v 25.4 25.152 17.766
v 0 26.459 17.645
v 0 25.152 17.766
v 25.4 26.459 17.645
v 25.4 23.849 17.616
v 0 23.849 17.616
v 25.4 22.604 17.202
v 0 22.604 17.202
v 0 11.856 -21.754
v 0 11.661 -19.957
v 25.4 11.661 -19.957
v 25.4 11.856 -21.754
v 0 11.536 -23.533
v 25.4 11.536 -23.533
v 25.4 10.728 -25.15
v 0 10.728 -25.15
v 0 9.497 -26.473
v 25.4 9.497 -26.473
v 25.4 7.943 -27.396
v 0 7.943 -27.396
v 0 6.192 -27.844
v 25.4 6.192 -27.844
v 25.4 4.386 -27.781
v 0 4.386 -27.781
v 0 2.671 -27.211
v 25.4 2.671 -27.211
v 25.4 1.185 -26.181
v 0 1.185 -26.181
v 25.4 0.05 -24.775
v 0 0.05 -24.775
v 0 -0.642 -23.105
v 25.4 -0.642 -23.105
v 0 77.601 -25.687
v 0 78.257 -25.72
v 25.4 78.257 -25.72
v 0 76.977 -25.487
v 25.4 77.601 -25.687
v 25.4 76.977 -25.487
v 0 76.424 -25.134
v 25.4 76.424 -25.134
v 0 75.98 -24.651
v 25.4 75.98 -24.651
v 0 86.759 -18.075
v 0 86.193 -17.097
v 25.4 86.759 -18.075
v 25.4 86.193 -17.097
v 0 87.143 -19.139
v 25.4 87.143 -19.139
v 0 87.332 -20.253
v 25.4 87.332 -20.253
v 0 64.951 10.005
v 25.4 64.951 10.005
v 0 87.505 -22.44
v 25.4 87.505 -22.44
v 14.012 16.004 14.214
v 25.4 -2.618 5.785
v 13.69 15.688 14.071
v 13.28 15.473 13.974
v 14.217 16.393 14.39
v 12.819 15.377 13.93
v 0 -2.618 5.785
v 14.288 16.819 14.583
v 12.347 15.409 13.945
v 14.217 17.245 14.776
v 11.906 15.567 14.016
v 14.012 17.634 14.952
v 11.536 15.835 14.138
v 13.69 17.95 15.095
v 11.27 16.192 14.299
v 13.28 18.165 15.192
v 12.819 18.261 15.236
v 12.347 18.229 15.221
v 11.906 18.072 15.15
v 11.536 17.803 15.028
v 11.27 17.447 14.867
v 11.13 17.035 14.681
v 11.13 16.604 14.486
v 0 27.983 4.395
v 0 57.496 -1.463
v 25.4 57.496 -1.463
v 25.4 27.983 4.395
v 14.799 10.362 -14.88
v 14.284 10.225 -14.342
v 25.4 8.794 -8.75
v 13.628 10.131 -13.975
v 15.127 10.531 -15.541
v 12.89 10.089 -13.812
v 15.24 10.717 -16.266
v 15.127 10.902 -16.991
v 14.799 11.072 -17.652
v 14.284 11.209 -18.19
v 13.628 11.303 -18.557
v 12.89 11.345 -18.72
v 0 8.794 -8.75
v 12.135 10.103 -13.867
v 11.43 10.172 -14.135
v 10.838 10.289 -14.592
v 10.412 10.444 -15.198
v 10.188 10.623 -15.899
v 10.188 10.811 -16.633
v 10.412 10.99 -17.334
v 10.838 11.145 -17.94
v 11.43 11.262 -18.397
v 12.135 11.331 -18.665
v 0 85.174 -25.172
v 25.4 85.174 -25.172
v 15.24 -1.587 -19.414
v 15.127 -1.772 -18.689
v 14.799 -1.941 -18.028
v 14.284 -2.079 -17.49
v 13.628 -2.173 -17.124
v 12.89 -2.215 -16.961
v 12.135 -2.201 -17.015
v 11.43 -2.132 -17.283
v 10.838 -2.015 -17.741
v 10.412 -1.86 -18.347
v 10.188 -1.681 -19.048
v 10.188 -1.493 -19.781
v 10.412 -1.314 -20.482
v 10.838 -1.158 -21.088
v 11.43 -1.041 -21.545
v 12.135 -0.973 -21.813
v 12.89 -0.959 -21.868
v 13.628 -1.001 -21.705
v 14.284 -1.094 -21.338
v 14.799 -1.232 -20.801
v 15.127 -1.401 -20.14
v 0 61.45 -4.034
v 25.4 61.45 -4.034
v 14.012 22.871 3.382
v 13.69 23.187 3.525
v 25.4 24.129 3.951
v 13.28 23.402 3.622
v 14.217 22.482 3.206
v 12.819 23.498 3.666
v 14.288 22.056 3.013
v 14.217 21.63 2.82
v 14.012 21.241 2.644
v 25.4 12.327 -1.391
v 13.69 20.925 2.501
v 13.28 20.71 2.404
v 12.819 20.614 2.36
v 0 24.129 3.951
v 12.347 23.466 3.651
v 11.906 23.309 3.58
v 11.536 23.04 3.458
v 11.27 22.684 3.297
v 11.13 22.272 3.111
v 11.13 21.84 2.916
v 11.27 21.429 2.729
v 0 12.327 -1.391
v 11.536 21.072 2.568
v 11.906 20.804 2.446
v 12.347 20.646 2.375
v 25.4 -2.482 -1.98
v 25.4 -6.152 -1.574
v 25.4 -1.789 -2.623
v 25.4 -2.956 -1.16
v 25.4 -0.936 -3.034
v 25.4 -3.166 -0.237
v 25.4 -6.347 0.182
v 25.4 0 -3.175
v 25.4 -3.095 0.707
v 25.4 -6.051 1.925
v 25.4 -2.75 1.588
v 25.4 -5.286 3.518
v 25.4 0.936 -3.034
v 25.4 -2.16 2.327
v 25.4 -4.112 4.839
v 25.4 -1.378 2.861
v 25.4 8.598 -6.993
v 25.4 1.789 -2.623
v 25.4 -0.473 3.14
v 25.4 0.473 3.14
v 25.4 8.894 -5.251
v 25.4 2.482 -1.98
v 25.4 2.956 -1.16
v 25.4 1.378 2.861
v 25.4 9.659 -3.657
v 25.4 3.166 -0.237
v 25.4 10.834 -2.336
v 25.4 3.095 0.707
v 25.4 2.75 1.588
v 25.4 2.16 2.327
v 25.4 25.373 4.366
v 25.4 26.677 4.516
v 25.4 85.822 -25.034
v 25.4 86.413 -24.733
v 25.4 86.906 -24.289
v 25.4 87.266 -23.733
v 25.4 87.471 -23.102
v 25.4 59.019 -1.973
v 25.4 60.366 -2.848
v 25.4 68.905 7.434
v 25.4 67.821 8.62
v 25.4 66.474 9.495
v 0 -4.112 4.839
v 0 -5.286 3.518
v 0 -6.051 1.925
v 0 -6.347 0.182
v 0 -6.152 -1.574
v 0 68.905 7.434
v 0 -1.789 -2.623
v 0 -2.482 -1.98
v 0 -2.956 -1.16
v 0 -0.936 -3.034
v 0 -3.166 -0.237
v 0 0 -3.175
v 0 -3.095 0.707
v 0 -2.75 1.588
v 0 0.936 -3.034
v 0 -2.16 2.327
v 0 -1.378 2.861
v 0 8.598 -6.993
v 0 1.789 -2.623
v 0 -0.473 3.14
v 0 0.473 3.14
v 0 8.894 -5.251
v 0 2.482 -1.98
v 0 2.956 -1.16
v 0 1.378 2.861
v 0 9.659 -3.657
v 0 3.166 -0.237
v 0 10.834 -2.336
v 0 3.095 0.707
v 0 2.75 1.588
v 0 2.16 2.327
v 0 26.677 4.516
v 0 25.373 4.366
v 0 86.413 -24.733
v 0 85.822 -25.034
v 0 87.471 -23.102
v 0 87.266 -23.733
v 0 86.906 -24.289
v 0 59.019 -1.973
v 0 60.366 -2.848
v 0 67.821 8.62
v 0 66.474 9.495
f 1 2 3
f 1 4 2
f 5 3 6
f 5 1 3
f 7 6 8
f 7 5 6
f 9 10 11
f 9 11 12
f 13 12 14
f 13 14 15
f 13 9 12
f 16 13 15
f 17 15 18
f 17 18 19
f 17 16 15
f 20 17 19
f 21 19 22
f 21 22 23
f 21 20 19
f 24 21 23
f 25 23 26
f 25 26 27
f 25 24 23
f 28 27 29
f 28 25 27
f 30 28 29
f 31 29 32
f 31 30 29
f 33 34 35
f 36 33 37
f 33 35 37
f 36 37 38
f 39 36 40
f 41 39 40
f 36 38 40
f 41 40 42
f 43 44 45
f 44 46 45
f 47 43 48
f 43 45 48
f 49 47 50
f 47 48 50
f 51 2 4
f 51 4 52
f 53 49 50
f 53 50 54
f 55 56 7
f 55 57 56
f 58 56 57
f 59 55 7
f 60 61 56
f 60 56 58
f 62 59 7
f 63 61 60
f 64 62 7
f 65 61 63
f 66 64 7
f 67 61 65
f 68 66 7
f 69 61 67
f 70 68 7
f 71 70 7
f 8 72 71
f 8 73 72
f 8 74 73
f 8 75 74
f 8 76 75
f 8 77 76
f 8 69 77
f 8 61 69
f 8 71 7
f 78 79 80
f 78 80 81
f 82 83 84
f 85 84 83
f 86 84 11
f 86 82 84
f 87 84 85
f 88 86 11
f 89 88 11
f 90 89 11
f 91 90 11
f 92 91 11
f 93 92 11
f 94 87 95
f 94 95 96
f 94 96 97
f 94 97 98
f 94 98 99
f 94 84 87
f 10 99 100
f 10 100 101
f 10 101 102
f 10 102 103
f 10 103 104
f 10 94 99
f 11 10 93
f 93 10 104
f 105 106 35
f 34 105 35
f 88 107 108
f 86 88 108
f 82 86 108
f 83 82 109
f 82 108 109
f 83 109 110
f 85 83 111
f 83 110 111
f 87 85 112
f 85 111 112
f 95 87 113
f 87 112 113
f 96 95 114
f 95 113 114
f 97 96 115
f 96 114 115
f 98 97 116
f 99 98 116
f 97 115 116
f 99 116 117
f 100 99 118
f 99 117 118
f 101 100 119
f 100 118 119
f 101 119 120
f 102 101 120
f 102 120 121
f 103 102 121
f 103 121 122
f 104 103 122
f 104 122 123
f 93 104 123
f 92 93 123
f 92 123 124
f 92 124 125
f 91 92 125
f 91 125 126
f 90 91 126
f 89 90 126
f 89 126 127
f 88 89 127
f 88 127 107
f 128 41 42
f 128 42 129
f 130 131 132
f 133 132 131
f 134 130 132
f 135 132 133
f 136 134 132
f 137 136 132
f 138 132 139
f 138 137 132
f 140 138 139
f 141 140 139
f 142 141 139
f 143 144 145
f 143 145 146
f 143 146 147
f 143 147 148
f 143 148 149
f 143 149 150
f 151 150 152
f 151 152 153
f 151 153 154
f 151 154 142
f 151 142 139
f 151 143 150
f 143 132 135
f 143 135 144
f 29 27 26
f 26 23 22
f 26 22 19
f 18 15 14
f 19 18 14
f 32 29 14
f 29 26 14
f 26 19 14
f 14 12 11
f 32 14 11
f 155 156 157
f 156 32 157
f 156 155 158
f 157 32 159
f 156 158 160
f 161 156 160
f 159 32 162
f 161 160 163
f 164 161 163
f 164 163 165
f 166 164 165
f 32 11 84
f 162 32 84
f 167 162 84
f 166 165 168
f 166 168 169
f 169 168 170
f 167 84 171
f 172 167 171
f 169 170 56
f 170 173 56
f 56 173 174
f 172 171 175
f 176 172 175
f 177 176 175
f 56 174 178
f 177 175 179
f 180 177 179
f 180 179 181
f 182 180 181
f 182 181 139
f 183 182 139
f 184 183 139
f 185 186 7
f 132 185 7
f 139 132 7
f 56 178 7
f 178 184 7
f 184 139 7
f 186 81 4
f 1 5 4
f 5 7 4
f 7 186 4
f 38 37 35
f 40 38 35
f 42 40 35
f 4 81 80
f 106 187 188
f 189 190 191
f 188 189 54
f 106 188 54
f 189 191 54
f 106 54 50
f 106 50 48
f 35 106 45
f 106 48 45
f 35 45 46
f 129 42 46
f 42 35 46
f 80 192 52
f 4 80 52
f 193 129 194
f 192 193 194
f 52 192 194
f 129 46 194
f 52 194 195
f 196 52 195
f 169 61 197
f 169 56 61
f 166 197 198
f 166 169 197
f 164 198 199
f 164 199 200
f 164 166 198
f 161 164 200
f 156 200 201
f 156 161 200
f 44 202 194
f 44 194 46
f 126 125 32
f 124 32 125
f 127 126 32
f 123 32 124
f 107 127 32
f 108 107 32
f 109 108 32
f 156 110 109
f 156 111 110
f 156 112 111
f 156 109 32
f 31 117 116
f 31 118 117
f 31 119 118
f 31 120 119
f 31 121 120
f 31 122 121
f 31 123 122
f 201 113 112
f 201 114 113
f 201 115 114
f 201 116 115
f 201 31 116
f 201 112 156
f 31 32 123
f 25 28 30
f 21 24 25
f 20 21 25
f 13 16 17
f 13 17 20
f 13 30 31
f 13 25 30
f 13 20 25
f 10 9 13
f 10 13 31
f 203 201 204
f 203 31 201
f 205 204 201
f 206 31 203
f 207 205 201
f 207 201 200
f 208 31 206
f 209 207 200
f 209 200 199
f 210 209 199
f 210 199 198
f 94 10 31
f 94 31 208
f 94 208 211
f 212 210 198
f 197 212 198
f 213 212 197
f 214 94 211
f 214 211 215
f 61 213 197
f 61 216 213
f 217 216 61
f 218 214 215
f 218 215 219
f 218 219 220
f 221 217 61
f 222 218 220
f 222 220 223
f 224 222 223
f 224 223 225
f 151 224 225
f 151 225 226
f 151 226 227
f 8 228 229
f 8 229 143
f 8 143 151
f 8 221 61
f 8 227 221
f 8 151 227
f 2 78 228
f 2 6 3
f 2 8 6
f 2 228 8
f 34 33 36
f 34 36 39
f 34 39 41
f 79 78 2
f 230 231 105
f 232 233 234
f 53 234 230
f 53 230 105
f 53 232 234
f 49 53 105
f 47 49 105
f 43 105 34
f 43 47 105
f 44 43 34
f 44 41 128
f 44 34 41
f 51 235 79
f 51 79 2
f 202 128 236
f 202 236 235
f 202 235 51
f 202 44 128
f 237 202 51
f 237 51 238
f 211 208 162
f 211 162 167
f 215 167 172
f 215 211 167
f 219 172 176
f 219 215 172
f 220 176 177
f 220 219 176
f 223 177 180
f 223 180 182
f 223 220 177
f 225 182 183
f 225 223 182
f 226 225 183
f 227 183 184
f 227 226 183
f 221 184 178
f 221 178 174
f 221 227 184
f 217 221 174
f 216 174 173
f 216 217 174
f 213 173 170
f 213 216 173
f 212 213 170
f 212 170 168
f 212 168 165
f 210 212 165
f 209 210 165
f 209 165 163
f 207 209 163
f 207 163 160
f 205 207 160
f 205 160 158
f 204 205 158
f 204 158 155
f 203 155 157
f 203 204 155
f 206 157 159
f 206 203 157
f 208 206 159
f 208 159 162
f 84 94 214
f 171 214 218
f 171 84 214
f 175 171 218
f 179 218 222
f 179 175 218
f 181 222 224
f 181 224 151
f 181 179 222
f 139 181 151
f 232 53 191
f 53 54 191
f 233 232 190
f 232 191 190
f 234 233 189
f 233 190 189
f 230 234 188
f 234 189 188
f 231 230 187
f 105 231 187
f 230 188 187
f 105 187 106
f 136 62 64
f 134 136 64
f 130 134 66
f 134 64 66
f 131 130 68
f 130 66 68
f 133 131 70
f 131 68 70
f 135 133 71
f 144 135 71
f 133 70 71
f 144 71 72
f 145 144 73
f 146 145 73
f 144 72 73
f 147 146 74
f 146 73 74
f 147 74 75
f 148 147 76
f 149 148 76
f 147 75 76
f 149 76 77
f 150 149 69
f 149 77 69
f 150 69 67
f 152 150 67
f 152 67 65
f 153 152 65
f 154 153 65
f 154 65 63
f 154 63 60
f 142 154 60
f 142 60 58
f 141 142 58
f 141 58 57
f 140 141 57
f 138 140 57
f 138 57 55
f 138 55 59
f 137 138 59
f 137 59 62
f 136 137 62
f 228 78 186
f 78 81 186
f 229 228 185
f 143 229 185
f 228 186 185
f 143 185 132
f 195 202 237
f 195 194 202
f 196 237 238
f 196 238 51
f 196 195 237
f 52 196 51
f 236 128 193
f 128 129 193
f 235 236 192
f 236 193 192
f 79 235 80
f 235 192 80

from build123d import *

# Parameters (mm, degrees)
SKETCH1_R           = 3.175
BOSS_EXTRUDE1_DEPTH = 25.4
FILLET1_R           = 6.35
CUT_EXTRUDE1_REACH  = 97.723
SKETCH2_R           = 2.54
CUT_EXTRUDE2_REACH  = 69.917
SKETCH3_R           = 1.5875
FILLET2_R           = 2.54


with BuildPart() as part:
    # Sketch1 → Boss-Extrude1 (new body)
    with BuildSketch(Plane(origin=(0, 0, 0), x_dir=(0, 0, -1), z_dir=(1, 0, 0))):
        with BuildLine():
            Line((-9.510223779, 67.442100456), (18.518782335, 87.194732923))
            Line((18.518782335, 87.194732923), (24.971703957, 87.705940953))
            Line((24.971703957, 87.705940953), (25.834610798, 76.813564689))
            Line((25.834610798, 76.813564689), (1.957775741, 59.987054843))
            Line((1.957775741, 59.987054843), (-4.791410802, 25.984772629))
            Line((-4.791410802, 25.984772629), (3.587814077, 7.472662593))
            Line((3.587814077, 7.472662593), (19.957119618, 11.661325034))
            ThreePointArc((19.957119618, 11.661325034), (27.683063897, 7.083685359), (23.105424222, -0.64225892))
            Line((23.105424222, -0.64225892), (-3.587814077, -7.472662593))
            Line((-3.587814077, -7.472662593), (-18.041777156, 24.460285718))
            Line((-18.041777156, 24.460285718), (-9.510223779, 67.442100456))
        make_face()
        Circle(SKETCH1_R, mode=Mode.SUBTRACT)
    extrude(amount=BOSS_EXTRUDE1_DEPTH)

    # Fillet1
    fillet1_edges = [part.edges().sort_by_distance(p)[0] for p in [
        (12.7, 67.442100456, 9.510223779),
        (12.7, 87.194732923, -18.518782335),
        (12.7, 59.987054843, -1.957775741),
        (12.7, 25.984772629, 4.791410802),
        (12.7, 7.472662593, -3.587814077),
        (12.7, -7.472662593, 3.587814077),
        (12.7, 24.460285718, 18.041777156),
    ]]
    fillet(fillet1_edges, radius=FILLET1_R)

    # Sketch2 → Cut-Extrude1 (cut, up to next)
    with BuildSketch(Plane(origin=(0, -6.151791977, -1.574152302), x_dir=(1, 0, 0), z_dir=(0, -0.968786138, -0.247898)), mode=Mode.PRIVATE) as cut_extrude1_sk1:
        with Locations((12.7, -18.415)):
            Circle(SKETCH2_R)
    cut_extrude1_tool1 = extrude(cut_extrude1_sk1.sketch, amount=-CUT_EXTRUDE1_REACH, mode=Mode.PRIVATE) & part.part
    add(cut_extrude1_tool1.solids().sort_by_distance((12.7, -1.58675, -19.414349))[0], mode=Mode.SUBTRACT)

    # Sketch3 → Cut-Extrude2 (cut, up to next)
    with BuildSketch(Plane(origin=(0, -2.618484858, 5.784983755), x_dir=(1, 0, 0), z_dir=(0, -0.41235982, 0.911021064)), mode=Mode.PRIVATE) as cut_extrude2_sk1:
        with Locations((12.7, 21.336)):
            Circle(SKETCH3_R)
    cut_extrude2_tool1 = extrude(cut_extrude2_sk1.sketch, amount=-CUT_EXTRUDE2_REACH, mode=Mode.PRIVATE) & part.part
    add(cut_extrude2_tool1.solids().sort_by_distance((12.7, 16.819061, 14.583093))[0], mode=Mode.SUBTRACT)

    # Fillet2
    fillet2_edges = [part.edges().sort_by_distance(p)[0] for p in [
        (12.7, 87.705940953, -24.971703957),
        (12.7, 76.813564689, -25.834610798),
    ]]
    fillet(fillet2_edges, radius=FILLET2_R)


solid = part.part
